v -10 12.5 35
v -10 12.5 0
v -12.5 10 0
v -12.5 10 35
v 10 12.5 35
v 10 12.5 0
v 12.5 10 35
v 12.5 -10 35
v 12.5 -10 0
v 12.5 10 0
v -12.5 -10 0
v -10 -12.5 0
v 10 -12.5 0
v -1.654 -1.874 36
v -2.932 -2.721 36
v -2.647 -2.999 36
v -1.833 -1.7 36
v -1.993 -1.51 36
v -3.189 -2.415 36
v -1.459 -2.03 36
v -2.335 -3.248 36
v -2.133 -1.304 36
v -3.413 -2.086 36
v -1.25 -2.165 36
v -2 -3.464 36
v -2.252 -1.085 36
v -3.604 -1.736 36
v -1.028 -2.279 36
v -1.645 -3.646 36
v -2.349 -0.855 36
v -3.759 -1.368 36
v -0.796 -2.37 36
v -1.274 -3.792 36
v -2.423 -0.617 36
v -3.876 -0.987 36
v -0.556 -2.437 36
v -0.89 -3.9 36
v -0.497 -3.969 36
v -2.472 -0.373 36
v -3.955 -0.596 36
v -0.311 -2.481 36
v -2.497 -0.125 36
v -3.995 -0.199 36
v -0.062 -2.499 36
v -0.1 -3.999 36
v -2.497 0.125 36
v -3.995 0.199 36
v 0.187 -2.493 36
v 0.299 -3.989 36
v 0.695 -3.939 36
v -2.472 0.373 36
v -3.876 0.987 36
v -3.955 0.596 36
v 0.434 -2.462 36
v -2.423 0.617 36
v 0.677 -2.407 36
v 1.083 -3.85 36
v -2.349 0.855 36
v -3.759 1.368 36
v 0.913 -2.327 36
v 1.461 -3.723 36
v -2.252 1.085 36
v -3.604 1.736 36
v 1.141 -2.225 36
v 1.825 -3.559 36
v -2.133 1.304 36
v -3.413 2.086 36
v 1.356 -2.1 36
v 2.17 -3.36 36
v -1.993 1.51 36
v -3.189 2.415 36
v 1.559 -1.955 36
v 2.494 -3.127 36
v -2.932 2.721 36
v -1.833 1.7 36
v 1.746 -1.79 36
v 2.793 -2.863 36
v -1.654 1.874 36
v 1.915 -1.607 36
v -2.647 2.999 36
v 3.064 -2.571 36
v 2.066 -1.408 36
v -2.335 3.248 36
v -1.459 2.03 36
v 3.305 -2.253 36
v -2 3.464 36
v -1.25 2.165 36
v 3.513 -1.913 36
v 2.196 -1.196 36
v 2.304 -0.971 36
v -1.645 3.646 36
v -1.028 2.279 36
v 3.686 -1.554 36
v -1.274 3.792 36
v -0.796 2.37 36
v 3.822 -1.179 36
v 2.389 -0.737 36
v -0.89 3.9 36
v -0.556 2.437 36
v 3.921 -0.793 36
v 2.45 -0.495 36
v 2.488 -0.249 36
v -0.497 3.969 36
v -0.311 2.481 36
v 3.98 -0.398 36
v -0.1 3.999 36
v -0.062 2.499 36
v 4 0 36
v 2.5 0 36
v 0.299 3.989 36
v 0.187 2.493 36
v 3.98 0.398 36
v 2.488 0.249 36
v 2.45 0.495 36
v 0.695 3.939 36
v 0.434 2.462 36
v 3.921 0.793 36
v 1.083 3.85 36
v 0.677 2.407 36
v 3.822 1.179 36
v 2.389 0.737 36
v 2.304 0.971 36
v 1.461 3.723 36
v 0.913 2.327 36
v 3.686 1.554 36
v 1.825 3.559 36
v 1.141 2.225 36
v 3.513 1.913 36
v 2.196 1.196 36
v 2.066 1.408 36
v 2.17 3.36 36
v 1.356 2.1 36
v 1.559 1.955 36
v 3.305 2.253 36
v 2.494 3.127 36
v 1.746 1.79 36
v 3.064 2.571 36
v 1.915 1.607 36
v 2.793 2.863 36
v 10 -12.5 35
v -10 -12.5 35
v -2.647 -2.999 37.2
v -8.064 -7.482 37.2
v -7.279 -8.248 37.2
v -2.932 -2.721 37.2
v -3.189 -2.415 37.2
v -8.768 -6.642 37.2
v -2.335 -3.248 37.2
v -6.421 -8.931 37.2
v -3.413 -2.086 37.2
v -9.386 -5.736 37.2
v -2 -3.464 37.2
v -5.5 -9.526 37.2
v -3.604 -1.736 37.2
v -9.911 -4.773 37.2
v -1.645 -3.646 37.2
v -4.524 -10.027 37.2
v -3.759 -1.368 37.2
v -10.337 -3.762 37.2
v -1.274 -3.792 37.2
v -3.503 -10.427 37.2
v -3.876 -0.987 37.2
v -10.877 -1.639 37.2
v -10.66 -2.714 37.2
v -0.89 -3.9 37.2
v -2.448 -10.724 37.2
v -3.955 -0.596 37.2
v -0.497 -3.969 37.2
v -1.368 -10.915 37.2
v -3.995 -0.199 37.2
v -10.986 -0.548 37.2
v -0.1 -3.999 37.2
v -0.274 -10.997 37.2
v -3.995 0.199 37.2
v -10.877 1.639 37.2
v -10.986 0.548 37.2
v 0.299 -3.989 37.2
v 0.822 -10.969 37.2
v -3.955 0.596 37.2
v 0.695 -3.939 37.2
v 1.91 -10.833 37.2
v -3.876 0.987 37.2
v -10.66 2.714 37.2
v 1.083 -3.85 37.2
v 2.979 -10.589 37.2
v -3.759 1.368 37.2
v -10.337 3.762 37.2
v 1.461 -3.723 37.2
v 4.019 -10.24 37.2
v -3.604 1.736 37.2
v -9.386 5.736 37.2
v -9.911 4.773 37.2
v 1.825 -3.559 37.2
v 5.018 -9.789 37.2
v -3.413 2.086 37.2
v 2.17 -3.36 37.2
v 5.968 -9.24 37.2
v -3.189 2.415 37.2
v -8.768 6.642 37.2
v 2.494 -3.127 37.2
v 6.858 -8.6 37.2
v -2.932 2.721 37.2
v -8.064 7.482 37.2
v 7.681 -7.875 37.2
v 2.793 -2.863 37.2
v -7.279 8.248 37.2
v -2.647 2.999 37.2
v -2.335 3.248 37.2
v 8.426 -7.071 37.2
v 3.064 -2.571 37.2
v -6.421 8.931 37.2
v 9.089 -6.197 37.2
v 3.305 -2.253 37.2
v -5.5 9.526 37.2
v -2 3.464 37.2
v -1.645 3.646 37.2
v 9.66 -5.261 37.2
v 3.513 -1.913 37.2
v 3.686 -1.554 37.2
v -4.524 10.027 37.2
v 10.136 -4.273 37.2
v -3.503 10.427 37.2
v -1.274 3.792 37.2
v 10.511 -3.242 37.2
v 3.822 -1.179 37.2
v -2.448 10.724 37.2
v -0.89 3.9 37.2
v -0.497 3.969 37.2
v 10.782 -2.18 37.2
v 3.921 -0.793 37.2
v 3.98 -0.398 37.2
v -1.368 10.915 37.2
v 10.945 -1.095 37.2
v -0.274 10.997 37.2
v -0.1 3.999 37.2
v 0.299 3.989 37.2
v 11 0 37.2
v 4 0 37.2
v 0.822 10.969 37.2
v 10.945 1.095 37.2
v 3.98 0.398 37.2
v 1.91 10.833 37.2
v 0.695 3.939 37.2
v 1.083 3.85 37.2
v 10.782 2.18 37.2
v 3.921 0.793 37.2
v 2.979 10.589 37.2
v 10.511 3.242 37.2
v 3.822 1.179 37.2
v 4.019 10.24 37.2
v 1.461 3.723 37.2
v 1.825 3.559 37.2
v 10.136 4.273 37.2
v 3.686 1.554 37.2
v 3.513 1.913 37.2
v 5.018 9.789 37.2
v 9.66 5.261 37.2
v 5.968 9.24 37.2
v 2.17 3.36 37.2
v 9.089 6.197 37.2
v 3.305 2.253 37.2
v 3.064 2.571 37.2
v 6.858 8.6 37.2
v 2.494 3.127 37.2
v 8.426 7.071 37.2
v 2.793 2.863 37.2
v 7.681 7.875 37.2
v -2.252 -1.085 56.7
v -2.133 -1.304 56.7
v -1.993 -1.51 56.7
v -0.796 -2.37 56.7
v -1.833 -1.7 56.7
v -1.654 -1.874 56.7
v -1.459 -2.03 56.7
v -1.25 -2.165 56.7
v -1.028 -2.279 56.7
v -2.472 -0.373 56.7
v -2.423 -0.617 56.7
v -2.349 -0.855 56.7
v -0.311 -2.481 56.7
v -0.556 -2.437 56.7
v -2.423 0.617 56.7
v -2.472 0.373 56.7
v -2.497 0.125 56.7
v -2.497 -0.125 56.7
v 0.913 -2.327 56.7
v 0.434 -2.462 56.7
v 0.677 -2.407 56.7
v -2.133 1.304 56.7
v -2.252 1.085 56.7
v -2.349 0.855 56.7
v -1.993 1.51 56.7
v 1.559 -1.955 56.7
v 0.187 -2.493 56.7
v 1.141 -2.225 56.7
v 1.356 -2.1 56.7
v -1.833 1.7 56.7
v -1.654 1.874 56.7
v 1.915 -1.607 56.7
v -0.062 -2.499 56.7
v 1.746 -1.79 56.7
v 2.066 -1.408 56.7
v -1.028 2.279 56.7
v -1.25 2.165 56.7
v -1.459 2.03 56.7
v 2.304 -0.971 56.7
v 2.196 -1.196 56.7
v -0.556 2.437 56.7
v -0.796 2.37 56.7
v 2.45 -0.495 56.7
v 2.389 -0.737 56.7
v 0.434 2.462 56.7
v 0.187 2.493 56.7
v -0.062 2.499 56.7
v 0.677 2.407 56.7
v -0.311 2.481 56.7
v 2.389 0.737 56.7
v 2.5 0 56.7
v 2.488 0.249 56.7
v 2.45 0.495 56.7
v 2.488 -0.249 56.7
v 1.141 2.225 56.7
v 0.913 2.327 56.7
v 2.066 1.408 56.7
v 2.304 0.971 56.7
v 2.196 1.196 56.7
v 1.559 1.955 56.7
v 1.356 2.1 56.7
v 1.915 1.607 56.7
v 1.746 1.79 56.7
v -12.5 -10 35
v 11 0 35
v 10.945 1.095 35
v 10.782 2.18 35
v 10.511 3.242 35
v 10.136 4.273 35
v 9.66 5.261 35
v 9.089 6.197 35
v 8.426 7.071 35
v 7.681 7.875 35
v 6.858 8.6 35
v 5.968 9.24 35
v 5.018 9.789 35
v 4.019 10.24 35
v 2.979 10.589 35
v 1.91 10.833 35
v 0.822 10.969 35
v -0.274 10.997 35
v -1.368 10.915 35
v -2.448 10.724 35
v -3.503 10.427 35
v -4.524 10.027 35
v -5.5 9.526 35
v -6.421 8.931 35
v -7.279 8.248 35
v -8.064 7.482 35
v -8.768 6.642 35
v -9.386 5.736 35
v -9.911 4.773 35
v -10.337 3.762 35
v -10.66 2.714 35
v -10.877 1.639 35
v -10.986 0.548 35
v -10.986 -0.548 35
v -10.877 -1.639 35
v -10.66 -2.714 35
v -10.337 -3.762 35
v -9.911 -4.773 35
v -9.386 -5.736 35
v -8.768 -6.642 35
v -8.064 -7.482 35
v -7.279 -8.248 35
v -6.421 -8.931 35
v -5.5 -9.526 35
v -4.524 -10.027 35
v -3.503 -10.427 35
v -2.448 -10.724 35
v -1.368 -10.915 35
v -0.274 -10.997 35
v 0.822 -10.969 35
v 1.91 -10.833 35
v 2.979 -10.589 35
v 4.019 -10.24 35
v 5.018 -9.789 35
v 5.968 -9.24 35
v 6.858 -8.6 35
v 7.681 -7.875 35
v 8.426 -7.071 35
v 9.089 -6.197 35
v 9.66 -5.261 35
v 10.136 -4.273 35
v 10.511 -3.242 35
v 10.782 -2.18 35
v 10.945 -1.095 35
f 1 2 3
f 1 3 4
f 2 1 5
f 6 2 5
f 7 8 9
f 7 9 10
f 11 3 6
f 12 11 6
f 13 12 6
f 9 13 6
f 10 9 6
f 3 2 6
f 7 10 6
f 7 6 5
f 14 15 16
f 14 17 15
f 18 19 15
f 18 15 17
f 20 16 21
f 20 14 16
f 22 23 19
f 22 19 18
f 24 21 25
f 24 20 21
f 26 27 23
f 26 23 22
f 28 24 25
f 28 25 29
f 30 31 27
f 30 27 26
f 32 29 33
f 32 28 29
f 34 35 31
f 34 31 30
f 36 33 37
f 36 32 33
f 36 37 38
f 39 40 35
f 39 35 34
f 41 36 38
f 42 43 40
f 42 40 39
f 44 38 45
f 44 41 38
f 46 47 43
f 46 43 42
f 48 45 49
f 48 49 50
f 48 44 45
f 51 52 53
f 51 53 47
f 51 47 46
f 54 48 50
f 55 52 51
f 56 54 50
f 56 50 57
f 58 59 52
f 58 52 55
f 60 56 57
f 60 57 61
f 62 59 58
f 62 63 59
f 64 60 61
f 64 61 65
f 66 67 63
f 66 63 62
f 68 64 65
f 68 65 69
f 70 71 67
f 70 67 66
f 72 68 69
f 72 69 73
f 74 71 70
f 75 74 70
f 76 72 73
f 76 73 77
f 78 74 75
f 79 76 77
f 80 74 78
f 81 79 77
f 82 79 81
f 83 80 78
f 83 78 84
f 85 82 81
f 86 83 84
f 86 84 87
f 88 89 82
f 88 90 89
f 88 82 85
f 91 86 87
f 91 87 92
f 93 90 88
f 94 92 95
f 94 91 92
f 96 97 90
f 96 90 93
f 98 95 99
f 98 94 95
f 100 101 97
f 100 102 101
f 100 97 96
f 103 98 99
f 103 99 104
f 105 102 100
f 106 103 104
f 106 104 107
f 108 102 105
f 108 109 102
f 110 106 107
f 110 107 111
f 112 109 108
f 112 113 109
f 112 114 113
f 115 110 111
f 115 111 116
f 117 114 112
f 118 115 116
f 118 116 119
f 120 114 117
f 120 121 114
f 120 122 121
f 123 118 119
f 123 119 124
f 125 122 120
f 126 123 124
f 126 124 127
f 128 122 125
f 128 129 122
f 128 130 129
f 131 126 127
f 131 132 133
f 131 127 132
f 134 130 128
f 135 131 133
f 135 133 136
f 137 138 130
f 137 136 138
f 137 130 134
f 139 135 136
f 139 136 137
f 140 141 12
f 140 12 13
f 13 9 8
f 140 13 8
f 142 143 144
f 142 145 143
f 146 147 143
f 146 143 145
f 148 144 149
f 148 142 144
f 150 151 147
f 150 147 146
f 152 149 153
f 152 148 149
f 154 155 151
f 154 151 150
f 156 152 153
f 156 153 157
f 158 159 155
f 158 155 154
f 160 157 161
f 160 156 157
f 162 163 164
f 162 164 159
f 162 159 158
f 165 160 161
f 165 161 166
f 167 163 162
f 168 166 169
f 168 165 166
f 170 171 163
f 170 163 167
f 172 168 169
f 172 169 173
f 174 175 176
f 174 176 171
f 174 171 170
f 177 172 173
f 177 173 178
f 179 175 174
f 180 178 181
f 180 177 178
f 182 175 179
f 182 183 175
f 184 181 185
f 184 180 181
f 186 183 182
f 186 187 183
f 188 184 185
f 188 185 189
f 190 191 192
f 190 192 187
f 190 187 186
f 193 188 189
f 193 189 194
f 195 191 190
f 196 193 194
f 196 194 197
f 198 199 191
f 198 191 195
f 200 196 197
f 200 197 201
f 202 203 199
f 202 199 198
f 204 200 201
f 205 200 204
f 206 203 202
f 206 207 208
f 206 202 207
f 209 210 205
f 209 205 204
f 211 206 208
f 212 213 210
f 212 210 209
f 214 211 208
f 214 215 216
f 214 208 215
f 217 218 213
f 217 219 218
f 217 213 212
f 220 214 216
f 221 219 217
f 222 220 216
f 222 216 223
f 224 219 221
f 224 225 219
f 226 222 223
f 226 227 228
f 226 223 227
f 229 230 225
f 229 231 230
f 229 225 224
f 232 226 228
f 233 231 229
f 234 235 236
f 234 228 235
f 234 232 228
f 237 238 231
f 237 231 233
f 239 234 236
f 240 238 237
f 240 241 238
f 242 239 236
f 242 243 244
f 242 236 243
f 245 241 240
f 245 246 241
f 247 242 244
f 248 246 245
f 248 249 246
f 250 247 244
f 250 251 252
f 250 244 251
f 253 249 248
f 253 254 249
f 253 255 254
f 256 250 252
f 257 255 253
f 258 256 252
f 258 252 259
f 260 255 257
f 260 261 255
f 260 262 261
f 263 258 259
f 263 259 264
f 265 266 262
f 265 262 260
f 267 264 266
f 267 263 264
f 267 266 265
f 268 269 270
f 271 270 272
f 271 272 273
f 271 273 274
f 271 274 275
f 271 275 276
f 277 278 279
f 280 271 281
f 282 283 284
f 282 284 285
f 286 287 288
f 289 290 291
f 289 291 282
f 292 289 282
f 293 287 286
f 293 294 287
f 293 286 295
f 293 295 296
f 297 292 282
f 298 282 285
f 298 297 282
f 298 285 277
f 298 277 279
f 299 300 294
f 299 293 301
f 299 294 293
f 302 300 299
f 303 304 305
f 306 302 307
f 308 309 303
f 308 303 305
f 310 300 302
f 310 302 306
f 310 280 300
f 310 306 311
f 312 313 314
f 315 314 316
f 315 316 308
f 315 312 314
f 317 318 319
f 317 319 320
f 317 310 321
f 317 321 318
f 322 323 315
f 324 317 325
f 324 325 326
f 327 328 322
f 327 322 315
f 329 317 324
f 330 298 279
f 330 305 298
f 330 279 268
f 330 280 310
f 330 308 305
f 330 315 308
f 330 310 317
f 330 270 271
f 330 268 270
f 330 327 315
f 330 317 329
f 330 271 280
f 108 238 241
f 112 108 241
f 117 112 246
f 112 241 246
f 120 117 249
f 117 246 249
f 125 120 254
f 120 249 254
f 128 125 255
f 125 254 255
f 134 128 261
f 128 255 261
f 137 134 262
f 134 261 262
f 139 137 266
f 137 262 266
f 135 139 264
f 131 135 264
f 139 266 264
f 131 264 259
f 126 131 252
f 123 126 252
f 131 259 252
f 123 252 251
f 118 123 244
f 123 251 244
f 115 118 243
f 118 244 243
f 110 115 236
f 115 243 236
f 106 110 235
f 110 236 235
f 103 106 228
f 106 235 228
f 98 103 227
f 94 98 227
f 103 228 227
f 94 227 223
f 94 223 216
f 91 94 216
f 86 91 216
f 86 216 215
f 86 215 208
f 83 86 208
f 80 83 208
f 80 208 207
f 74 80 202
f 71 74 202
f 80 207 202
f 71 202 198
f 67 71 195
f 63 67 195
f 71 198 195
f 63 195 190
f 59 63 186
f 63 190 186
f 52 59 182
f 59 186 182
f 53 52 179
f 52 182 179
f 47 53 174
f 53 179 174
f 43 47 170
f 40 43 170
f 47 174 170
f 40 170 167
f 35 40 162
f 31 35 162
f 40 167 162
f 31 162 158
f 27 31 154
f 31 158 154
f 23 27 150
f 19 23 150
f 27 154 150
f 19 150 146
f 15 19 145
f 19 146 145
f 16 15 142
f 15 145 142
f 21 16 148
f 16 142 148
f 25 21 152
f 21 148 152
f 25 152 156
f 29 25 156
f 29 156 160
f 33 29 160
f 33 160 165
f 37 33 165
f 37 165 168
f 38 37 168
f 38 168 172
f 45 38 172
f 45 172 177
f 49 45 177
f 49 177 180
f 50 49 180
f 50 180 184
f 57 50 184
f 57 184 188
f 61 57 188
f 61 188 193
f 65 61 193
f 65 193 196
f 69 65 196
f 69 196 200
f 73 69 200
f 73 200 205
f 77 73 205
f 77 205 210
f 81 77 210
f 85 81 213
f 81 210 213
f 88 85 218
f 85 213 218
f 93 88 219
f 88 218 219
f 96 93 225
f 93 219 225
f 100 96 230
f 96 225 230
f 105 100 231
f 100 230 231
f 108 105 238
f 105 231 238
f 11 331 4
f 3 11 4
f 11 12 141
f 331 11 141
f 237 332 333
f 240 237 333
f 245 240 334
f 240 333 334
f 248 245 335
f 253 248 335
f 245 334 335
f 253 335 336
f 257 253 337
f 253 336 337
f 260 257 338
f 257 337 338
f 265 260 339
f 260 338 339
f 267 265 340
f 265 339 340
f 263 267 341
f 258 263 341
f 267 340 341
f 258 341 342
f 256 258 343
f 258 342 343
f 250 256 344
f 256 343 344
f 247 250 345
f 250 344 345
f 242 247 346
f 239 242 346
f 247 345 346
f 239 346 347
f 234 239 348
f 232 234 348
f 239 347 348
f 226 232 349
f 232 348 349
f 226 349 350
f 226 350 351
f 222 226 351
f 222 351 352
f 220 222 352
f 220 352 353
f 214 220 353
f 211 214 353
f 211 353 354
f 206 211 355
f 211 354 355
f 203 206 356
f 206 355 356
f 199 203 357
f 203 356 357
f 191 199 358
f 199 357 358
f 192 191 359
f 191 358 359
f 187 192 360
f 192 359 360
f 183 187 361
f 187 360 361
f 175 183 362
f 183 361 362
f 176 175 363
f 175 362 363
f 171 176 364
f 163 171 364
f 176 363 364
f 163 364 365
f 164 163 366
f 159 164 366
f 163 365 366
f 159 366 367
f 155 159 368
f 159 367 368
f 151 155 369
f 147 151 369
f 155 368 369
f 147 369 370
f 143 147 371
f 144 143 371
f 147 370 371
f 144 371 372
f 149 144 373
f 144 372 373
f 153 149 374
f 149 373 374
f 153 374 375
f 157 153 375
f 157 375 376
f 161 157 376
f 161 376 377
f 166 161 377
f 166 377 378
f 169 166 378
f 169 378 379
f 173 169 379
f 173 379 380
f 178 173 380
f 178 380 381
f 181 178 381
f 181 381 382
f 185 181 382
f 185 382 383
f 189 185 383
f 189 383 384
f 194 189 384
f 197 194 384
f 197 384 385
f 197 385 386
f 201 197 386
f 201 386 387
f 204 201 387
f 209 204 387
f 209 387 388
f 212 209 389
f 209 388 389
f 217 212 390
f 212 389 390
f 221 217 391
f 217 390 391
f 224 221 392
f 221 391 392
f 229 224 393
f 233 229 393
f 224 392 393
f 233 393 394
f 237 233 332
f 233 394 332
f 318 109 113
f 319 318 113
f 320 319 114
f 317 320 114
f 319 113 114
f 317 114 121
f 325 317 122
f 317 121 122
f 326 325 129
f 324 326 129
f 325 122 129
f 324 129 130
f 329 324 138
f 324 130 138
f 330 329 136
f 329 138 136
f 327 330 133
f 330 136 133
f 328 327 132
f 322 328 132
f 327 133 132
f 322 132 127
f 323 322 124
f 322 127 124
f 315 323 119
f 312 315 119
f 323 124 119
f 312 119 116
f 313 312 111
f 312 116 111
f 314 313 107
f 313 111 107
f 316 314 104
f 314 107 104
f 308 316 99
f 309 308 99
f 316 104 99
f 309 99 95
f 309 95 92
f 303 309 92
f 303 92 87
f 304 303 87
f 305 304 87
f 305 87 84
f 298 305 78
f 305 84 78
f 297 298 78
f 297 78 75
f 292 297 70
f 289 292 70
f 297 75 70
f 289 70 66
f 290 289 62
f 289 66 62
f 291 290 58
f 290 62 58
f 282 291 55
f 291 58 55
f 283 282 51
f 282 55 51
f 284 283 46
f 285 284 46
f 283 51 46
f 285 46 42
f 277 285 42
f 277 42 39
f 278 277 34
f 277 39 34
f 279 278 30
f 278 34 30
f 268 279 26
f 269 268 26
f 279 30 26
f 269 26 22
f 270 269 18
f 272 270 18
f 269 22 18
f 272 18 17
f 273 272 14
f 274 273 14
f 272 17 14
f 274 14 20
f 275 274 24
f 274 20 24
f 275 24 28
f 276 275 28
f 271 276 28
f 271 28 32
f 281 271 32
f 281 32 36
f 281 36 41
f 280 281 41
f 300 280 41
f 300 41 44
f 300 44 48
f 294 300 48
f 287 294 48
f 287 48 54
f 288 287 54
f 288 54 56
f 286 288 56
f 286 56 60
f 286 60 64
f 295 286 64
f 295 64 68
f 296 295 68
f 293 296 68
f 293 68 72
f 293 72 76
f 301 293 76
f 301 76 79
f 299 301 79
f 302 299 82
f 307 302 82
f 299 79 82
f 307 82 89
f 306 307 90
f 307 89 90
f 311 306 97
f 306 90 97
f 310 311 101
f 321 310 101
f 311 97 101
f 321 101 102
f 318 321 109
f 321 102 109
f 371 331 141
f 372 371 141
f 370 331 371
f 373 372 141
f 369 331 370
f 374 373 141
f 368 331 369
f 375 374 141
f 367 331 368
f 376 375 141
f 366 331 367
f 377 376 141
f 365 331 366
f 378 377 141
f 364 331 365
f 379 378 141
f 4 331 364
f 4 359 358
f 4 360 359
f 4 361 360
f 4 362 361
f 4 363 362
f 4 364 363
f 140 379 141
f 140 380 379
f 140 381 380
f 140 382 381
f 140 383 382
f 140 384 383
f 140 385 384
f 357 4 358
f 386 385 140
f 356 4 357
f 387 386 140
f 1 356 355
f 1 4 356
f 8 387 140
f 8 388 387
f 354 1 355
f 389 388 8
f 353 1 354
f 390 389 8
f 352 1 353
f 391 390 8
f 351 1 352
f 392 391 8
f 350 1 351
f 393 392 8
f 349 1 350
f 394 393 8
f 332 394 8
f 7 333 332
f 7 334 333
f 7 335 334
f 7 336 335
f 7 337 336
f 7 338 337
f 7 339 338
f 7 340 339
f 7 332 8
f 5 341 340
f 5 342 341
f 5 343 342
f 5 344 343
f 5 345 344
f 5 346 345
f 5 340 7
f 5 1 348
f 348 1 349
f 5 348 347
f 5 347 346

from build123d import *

# Parameters (mm, degrees)
SKETCH1_W           = 25
SKETCH1_H           = 25
BOSS_EXTRUDE1_DEPTH = 35
SKETCH2_R           = 11
BOSS_EXTRUDE2_DEPTH = 2.2
CHAMFER1_SIZE       = 2.5
SKETCH4_R           = 4
CUT_EXTRUDE1_DEPTH  = 1.2
SKETCH3_R           = 2.5
BOSS_EXTRUDE3_DEPTH = 20.7


with BuildPart() as part:
    # Sketch1 → Boss-Extrude1 (new body)
    with BuildSketch(Plane.XY):
        Rectangle(SKETCH1_W, SKETCH1_H)
    extrude(amount=BOSS_EXTRUDE1_DEPTH)

    # Sketch2 → Boss-Extrude2 (add)
    with BuildSketch(Plane.XY.offset(35)):
        Circle(SKETCH2_R)
    extrude(amount=BOSS_EXTRUDE2_DEPTH)

    # Chamfer1
    chamfer1_edges = [part.edges().sort_by_distance(p)[0] for p in [
        (12.5, -12.5, 17.5),
        (-12.5, -12.5, 17.5),
        (-12.5, 12.5, 17.5),
        (12.5, 12.5, 17.5),
    ]]
    chamfer(chamfer1_edges, length=CHAMFER1_SIZE)

    # Sketch4 → Cut-Extrude1 (cut)
    with BuildSketch(Plane.XY.offset(37.2)):
        Circle(SKETCH4_R)
    extrude(amount=-CUT_EXTRUDE1_DEPTH, mode=Mode.SUBTRACT)

    # Sketch3 → Boss-Extrude3 (add)
    with BuildSketch(Plane.XY.offset(36)):
        Circle(SKETCH3_R)
    extrude(amount=BOSS_EXTRUDE3_DEPTH)


solid = part.part
